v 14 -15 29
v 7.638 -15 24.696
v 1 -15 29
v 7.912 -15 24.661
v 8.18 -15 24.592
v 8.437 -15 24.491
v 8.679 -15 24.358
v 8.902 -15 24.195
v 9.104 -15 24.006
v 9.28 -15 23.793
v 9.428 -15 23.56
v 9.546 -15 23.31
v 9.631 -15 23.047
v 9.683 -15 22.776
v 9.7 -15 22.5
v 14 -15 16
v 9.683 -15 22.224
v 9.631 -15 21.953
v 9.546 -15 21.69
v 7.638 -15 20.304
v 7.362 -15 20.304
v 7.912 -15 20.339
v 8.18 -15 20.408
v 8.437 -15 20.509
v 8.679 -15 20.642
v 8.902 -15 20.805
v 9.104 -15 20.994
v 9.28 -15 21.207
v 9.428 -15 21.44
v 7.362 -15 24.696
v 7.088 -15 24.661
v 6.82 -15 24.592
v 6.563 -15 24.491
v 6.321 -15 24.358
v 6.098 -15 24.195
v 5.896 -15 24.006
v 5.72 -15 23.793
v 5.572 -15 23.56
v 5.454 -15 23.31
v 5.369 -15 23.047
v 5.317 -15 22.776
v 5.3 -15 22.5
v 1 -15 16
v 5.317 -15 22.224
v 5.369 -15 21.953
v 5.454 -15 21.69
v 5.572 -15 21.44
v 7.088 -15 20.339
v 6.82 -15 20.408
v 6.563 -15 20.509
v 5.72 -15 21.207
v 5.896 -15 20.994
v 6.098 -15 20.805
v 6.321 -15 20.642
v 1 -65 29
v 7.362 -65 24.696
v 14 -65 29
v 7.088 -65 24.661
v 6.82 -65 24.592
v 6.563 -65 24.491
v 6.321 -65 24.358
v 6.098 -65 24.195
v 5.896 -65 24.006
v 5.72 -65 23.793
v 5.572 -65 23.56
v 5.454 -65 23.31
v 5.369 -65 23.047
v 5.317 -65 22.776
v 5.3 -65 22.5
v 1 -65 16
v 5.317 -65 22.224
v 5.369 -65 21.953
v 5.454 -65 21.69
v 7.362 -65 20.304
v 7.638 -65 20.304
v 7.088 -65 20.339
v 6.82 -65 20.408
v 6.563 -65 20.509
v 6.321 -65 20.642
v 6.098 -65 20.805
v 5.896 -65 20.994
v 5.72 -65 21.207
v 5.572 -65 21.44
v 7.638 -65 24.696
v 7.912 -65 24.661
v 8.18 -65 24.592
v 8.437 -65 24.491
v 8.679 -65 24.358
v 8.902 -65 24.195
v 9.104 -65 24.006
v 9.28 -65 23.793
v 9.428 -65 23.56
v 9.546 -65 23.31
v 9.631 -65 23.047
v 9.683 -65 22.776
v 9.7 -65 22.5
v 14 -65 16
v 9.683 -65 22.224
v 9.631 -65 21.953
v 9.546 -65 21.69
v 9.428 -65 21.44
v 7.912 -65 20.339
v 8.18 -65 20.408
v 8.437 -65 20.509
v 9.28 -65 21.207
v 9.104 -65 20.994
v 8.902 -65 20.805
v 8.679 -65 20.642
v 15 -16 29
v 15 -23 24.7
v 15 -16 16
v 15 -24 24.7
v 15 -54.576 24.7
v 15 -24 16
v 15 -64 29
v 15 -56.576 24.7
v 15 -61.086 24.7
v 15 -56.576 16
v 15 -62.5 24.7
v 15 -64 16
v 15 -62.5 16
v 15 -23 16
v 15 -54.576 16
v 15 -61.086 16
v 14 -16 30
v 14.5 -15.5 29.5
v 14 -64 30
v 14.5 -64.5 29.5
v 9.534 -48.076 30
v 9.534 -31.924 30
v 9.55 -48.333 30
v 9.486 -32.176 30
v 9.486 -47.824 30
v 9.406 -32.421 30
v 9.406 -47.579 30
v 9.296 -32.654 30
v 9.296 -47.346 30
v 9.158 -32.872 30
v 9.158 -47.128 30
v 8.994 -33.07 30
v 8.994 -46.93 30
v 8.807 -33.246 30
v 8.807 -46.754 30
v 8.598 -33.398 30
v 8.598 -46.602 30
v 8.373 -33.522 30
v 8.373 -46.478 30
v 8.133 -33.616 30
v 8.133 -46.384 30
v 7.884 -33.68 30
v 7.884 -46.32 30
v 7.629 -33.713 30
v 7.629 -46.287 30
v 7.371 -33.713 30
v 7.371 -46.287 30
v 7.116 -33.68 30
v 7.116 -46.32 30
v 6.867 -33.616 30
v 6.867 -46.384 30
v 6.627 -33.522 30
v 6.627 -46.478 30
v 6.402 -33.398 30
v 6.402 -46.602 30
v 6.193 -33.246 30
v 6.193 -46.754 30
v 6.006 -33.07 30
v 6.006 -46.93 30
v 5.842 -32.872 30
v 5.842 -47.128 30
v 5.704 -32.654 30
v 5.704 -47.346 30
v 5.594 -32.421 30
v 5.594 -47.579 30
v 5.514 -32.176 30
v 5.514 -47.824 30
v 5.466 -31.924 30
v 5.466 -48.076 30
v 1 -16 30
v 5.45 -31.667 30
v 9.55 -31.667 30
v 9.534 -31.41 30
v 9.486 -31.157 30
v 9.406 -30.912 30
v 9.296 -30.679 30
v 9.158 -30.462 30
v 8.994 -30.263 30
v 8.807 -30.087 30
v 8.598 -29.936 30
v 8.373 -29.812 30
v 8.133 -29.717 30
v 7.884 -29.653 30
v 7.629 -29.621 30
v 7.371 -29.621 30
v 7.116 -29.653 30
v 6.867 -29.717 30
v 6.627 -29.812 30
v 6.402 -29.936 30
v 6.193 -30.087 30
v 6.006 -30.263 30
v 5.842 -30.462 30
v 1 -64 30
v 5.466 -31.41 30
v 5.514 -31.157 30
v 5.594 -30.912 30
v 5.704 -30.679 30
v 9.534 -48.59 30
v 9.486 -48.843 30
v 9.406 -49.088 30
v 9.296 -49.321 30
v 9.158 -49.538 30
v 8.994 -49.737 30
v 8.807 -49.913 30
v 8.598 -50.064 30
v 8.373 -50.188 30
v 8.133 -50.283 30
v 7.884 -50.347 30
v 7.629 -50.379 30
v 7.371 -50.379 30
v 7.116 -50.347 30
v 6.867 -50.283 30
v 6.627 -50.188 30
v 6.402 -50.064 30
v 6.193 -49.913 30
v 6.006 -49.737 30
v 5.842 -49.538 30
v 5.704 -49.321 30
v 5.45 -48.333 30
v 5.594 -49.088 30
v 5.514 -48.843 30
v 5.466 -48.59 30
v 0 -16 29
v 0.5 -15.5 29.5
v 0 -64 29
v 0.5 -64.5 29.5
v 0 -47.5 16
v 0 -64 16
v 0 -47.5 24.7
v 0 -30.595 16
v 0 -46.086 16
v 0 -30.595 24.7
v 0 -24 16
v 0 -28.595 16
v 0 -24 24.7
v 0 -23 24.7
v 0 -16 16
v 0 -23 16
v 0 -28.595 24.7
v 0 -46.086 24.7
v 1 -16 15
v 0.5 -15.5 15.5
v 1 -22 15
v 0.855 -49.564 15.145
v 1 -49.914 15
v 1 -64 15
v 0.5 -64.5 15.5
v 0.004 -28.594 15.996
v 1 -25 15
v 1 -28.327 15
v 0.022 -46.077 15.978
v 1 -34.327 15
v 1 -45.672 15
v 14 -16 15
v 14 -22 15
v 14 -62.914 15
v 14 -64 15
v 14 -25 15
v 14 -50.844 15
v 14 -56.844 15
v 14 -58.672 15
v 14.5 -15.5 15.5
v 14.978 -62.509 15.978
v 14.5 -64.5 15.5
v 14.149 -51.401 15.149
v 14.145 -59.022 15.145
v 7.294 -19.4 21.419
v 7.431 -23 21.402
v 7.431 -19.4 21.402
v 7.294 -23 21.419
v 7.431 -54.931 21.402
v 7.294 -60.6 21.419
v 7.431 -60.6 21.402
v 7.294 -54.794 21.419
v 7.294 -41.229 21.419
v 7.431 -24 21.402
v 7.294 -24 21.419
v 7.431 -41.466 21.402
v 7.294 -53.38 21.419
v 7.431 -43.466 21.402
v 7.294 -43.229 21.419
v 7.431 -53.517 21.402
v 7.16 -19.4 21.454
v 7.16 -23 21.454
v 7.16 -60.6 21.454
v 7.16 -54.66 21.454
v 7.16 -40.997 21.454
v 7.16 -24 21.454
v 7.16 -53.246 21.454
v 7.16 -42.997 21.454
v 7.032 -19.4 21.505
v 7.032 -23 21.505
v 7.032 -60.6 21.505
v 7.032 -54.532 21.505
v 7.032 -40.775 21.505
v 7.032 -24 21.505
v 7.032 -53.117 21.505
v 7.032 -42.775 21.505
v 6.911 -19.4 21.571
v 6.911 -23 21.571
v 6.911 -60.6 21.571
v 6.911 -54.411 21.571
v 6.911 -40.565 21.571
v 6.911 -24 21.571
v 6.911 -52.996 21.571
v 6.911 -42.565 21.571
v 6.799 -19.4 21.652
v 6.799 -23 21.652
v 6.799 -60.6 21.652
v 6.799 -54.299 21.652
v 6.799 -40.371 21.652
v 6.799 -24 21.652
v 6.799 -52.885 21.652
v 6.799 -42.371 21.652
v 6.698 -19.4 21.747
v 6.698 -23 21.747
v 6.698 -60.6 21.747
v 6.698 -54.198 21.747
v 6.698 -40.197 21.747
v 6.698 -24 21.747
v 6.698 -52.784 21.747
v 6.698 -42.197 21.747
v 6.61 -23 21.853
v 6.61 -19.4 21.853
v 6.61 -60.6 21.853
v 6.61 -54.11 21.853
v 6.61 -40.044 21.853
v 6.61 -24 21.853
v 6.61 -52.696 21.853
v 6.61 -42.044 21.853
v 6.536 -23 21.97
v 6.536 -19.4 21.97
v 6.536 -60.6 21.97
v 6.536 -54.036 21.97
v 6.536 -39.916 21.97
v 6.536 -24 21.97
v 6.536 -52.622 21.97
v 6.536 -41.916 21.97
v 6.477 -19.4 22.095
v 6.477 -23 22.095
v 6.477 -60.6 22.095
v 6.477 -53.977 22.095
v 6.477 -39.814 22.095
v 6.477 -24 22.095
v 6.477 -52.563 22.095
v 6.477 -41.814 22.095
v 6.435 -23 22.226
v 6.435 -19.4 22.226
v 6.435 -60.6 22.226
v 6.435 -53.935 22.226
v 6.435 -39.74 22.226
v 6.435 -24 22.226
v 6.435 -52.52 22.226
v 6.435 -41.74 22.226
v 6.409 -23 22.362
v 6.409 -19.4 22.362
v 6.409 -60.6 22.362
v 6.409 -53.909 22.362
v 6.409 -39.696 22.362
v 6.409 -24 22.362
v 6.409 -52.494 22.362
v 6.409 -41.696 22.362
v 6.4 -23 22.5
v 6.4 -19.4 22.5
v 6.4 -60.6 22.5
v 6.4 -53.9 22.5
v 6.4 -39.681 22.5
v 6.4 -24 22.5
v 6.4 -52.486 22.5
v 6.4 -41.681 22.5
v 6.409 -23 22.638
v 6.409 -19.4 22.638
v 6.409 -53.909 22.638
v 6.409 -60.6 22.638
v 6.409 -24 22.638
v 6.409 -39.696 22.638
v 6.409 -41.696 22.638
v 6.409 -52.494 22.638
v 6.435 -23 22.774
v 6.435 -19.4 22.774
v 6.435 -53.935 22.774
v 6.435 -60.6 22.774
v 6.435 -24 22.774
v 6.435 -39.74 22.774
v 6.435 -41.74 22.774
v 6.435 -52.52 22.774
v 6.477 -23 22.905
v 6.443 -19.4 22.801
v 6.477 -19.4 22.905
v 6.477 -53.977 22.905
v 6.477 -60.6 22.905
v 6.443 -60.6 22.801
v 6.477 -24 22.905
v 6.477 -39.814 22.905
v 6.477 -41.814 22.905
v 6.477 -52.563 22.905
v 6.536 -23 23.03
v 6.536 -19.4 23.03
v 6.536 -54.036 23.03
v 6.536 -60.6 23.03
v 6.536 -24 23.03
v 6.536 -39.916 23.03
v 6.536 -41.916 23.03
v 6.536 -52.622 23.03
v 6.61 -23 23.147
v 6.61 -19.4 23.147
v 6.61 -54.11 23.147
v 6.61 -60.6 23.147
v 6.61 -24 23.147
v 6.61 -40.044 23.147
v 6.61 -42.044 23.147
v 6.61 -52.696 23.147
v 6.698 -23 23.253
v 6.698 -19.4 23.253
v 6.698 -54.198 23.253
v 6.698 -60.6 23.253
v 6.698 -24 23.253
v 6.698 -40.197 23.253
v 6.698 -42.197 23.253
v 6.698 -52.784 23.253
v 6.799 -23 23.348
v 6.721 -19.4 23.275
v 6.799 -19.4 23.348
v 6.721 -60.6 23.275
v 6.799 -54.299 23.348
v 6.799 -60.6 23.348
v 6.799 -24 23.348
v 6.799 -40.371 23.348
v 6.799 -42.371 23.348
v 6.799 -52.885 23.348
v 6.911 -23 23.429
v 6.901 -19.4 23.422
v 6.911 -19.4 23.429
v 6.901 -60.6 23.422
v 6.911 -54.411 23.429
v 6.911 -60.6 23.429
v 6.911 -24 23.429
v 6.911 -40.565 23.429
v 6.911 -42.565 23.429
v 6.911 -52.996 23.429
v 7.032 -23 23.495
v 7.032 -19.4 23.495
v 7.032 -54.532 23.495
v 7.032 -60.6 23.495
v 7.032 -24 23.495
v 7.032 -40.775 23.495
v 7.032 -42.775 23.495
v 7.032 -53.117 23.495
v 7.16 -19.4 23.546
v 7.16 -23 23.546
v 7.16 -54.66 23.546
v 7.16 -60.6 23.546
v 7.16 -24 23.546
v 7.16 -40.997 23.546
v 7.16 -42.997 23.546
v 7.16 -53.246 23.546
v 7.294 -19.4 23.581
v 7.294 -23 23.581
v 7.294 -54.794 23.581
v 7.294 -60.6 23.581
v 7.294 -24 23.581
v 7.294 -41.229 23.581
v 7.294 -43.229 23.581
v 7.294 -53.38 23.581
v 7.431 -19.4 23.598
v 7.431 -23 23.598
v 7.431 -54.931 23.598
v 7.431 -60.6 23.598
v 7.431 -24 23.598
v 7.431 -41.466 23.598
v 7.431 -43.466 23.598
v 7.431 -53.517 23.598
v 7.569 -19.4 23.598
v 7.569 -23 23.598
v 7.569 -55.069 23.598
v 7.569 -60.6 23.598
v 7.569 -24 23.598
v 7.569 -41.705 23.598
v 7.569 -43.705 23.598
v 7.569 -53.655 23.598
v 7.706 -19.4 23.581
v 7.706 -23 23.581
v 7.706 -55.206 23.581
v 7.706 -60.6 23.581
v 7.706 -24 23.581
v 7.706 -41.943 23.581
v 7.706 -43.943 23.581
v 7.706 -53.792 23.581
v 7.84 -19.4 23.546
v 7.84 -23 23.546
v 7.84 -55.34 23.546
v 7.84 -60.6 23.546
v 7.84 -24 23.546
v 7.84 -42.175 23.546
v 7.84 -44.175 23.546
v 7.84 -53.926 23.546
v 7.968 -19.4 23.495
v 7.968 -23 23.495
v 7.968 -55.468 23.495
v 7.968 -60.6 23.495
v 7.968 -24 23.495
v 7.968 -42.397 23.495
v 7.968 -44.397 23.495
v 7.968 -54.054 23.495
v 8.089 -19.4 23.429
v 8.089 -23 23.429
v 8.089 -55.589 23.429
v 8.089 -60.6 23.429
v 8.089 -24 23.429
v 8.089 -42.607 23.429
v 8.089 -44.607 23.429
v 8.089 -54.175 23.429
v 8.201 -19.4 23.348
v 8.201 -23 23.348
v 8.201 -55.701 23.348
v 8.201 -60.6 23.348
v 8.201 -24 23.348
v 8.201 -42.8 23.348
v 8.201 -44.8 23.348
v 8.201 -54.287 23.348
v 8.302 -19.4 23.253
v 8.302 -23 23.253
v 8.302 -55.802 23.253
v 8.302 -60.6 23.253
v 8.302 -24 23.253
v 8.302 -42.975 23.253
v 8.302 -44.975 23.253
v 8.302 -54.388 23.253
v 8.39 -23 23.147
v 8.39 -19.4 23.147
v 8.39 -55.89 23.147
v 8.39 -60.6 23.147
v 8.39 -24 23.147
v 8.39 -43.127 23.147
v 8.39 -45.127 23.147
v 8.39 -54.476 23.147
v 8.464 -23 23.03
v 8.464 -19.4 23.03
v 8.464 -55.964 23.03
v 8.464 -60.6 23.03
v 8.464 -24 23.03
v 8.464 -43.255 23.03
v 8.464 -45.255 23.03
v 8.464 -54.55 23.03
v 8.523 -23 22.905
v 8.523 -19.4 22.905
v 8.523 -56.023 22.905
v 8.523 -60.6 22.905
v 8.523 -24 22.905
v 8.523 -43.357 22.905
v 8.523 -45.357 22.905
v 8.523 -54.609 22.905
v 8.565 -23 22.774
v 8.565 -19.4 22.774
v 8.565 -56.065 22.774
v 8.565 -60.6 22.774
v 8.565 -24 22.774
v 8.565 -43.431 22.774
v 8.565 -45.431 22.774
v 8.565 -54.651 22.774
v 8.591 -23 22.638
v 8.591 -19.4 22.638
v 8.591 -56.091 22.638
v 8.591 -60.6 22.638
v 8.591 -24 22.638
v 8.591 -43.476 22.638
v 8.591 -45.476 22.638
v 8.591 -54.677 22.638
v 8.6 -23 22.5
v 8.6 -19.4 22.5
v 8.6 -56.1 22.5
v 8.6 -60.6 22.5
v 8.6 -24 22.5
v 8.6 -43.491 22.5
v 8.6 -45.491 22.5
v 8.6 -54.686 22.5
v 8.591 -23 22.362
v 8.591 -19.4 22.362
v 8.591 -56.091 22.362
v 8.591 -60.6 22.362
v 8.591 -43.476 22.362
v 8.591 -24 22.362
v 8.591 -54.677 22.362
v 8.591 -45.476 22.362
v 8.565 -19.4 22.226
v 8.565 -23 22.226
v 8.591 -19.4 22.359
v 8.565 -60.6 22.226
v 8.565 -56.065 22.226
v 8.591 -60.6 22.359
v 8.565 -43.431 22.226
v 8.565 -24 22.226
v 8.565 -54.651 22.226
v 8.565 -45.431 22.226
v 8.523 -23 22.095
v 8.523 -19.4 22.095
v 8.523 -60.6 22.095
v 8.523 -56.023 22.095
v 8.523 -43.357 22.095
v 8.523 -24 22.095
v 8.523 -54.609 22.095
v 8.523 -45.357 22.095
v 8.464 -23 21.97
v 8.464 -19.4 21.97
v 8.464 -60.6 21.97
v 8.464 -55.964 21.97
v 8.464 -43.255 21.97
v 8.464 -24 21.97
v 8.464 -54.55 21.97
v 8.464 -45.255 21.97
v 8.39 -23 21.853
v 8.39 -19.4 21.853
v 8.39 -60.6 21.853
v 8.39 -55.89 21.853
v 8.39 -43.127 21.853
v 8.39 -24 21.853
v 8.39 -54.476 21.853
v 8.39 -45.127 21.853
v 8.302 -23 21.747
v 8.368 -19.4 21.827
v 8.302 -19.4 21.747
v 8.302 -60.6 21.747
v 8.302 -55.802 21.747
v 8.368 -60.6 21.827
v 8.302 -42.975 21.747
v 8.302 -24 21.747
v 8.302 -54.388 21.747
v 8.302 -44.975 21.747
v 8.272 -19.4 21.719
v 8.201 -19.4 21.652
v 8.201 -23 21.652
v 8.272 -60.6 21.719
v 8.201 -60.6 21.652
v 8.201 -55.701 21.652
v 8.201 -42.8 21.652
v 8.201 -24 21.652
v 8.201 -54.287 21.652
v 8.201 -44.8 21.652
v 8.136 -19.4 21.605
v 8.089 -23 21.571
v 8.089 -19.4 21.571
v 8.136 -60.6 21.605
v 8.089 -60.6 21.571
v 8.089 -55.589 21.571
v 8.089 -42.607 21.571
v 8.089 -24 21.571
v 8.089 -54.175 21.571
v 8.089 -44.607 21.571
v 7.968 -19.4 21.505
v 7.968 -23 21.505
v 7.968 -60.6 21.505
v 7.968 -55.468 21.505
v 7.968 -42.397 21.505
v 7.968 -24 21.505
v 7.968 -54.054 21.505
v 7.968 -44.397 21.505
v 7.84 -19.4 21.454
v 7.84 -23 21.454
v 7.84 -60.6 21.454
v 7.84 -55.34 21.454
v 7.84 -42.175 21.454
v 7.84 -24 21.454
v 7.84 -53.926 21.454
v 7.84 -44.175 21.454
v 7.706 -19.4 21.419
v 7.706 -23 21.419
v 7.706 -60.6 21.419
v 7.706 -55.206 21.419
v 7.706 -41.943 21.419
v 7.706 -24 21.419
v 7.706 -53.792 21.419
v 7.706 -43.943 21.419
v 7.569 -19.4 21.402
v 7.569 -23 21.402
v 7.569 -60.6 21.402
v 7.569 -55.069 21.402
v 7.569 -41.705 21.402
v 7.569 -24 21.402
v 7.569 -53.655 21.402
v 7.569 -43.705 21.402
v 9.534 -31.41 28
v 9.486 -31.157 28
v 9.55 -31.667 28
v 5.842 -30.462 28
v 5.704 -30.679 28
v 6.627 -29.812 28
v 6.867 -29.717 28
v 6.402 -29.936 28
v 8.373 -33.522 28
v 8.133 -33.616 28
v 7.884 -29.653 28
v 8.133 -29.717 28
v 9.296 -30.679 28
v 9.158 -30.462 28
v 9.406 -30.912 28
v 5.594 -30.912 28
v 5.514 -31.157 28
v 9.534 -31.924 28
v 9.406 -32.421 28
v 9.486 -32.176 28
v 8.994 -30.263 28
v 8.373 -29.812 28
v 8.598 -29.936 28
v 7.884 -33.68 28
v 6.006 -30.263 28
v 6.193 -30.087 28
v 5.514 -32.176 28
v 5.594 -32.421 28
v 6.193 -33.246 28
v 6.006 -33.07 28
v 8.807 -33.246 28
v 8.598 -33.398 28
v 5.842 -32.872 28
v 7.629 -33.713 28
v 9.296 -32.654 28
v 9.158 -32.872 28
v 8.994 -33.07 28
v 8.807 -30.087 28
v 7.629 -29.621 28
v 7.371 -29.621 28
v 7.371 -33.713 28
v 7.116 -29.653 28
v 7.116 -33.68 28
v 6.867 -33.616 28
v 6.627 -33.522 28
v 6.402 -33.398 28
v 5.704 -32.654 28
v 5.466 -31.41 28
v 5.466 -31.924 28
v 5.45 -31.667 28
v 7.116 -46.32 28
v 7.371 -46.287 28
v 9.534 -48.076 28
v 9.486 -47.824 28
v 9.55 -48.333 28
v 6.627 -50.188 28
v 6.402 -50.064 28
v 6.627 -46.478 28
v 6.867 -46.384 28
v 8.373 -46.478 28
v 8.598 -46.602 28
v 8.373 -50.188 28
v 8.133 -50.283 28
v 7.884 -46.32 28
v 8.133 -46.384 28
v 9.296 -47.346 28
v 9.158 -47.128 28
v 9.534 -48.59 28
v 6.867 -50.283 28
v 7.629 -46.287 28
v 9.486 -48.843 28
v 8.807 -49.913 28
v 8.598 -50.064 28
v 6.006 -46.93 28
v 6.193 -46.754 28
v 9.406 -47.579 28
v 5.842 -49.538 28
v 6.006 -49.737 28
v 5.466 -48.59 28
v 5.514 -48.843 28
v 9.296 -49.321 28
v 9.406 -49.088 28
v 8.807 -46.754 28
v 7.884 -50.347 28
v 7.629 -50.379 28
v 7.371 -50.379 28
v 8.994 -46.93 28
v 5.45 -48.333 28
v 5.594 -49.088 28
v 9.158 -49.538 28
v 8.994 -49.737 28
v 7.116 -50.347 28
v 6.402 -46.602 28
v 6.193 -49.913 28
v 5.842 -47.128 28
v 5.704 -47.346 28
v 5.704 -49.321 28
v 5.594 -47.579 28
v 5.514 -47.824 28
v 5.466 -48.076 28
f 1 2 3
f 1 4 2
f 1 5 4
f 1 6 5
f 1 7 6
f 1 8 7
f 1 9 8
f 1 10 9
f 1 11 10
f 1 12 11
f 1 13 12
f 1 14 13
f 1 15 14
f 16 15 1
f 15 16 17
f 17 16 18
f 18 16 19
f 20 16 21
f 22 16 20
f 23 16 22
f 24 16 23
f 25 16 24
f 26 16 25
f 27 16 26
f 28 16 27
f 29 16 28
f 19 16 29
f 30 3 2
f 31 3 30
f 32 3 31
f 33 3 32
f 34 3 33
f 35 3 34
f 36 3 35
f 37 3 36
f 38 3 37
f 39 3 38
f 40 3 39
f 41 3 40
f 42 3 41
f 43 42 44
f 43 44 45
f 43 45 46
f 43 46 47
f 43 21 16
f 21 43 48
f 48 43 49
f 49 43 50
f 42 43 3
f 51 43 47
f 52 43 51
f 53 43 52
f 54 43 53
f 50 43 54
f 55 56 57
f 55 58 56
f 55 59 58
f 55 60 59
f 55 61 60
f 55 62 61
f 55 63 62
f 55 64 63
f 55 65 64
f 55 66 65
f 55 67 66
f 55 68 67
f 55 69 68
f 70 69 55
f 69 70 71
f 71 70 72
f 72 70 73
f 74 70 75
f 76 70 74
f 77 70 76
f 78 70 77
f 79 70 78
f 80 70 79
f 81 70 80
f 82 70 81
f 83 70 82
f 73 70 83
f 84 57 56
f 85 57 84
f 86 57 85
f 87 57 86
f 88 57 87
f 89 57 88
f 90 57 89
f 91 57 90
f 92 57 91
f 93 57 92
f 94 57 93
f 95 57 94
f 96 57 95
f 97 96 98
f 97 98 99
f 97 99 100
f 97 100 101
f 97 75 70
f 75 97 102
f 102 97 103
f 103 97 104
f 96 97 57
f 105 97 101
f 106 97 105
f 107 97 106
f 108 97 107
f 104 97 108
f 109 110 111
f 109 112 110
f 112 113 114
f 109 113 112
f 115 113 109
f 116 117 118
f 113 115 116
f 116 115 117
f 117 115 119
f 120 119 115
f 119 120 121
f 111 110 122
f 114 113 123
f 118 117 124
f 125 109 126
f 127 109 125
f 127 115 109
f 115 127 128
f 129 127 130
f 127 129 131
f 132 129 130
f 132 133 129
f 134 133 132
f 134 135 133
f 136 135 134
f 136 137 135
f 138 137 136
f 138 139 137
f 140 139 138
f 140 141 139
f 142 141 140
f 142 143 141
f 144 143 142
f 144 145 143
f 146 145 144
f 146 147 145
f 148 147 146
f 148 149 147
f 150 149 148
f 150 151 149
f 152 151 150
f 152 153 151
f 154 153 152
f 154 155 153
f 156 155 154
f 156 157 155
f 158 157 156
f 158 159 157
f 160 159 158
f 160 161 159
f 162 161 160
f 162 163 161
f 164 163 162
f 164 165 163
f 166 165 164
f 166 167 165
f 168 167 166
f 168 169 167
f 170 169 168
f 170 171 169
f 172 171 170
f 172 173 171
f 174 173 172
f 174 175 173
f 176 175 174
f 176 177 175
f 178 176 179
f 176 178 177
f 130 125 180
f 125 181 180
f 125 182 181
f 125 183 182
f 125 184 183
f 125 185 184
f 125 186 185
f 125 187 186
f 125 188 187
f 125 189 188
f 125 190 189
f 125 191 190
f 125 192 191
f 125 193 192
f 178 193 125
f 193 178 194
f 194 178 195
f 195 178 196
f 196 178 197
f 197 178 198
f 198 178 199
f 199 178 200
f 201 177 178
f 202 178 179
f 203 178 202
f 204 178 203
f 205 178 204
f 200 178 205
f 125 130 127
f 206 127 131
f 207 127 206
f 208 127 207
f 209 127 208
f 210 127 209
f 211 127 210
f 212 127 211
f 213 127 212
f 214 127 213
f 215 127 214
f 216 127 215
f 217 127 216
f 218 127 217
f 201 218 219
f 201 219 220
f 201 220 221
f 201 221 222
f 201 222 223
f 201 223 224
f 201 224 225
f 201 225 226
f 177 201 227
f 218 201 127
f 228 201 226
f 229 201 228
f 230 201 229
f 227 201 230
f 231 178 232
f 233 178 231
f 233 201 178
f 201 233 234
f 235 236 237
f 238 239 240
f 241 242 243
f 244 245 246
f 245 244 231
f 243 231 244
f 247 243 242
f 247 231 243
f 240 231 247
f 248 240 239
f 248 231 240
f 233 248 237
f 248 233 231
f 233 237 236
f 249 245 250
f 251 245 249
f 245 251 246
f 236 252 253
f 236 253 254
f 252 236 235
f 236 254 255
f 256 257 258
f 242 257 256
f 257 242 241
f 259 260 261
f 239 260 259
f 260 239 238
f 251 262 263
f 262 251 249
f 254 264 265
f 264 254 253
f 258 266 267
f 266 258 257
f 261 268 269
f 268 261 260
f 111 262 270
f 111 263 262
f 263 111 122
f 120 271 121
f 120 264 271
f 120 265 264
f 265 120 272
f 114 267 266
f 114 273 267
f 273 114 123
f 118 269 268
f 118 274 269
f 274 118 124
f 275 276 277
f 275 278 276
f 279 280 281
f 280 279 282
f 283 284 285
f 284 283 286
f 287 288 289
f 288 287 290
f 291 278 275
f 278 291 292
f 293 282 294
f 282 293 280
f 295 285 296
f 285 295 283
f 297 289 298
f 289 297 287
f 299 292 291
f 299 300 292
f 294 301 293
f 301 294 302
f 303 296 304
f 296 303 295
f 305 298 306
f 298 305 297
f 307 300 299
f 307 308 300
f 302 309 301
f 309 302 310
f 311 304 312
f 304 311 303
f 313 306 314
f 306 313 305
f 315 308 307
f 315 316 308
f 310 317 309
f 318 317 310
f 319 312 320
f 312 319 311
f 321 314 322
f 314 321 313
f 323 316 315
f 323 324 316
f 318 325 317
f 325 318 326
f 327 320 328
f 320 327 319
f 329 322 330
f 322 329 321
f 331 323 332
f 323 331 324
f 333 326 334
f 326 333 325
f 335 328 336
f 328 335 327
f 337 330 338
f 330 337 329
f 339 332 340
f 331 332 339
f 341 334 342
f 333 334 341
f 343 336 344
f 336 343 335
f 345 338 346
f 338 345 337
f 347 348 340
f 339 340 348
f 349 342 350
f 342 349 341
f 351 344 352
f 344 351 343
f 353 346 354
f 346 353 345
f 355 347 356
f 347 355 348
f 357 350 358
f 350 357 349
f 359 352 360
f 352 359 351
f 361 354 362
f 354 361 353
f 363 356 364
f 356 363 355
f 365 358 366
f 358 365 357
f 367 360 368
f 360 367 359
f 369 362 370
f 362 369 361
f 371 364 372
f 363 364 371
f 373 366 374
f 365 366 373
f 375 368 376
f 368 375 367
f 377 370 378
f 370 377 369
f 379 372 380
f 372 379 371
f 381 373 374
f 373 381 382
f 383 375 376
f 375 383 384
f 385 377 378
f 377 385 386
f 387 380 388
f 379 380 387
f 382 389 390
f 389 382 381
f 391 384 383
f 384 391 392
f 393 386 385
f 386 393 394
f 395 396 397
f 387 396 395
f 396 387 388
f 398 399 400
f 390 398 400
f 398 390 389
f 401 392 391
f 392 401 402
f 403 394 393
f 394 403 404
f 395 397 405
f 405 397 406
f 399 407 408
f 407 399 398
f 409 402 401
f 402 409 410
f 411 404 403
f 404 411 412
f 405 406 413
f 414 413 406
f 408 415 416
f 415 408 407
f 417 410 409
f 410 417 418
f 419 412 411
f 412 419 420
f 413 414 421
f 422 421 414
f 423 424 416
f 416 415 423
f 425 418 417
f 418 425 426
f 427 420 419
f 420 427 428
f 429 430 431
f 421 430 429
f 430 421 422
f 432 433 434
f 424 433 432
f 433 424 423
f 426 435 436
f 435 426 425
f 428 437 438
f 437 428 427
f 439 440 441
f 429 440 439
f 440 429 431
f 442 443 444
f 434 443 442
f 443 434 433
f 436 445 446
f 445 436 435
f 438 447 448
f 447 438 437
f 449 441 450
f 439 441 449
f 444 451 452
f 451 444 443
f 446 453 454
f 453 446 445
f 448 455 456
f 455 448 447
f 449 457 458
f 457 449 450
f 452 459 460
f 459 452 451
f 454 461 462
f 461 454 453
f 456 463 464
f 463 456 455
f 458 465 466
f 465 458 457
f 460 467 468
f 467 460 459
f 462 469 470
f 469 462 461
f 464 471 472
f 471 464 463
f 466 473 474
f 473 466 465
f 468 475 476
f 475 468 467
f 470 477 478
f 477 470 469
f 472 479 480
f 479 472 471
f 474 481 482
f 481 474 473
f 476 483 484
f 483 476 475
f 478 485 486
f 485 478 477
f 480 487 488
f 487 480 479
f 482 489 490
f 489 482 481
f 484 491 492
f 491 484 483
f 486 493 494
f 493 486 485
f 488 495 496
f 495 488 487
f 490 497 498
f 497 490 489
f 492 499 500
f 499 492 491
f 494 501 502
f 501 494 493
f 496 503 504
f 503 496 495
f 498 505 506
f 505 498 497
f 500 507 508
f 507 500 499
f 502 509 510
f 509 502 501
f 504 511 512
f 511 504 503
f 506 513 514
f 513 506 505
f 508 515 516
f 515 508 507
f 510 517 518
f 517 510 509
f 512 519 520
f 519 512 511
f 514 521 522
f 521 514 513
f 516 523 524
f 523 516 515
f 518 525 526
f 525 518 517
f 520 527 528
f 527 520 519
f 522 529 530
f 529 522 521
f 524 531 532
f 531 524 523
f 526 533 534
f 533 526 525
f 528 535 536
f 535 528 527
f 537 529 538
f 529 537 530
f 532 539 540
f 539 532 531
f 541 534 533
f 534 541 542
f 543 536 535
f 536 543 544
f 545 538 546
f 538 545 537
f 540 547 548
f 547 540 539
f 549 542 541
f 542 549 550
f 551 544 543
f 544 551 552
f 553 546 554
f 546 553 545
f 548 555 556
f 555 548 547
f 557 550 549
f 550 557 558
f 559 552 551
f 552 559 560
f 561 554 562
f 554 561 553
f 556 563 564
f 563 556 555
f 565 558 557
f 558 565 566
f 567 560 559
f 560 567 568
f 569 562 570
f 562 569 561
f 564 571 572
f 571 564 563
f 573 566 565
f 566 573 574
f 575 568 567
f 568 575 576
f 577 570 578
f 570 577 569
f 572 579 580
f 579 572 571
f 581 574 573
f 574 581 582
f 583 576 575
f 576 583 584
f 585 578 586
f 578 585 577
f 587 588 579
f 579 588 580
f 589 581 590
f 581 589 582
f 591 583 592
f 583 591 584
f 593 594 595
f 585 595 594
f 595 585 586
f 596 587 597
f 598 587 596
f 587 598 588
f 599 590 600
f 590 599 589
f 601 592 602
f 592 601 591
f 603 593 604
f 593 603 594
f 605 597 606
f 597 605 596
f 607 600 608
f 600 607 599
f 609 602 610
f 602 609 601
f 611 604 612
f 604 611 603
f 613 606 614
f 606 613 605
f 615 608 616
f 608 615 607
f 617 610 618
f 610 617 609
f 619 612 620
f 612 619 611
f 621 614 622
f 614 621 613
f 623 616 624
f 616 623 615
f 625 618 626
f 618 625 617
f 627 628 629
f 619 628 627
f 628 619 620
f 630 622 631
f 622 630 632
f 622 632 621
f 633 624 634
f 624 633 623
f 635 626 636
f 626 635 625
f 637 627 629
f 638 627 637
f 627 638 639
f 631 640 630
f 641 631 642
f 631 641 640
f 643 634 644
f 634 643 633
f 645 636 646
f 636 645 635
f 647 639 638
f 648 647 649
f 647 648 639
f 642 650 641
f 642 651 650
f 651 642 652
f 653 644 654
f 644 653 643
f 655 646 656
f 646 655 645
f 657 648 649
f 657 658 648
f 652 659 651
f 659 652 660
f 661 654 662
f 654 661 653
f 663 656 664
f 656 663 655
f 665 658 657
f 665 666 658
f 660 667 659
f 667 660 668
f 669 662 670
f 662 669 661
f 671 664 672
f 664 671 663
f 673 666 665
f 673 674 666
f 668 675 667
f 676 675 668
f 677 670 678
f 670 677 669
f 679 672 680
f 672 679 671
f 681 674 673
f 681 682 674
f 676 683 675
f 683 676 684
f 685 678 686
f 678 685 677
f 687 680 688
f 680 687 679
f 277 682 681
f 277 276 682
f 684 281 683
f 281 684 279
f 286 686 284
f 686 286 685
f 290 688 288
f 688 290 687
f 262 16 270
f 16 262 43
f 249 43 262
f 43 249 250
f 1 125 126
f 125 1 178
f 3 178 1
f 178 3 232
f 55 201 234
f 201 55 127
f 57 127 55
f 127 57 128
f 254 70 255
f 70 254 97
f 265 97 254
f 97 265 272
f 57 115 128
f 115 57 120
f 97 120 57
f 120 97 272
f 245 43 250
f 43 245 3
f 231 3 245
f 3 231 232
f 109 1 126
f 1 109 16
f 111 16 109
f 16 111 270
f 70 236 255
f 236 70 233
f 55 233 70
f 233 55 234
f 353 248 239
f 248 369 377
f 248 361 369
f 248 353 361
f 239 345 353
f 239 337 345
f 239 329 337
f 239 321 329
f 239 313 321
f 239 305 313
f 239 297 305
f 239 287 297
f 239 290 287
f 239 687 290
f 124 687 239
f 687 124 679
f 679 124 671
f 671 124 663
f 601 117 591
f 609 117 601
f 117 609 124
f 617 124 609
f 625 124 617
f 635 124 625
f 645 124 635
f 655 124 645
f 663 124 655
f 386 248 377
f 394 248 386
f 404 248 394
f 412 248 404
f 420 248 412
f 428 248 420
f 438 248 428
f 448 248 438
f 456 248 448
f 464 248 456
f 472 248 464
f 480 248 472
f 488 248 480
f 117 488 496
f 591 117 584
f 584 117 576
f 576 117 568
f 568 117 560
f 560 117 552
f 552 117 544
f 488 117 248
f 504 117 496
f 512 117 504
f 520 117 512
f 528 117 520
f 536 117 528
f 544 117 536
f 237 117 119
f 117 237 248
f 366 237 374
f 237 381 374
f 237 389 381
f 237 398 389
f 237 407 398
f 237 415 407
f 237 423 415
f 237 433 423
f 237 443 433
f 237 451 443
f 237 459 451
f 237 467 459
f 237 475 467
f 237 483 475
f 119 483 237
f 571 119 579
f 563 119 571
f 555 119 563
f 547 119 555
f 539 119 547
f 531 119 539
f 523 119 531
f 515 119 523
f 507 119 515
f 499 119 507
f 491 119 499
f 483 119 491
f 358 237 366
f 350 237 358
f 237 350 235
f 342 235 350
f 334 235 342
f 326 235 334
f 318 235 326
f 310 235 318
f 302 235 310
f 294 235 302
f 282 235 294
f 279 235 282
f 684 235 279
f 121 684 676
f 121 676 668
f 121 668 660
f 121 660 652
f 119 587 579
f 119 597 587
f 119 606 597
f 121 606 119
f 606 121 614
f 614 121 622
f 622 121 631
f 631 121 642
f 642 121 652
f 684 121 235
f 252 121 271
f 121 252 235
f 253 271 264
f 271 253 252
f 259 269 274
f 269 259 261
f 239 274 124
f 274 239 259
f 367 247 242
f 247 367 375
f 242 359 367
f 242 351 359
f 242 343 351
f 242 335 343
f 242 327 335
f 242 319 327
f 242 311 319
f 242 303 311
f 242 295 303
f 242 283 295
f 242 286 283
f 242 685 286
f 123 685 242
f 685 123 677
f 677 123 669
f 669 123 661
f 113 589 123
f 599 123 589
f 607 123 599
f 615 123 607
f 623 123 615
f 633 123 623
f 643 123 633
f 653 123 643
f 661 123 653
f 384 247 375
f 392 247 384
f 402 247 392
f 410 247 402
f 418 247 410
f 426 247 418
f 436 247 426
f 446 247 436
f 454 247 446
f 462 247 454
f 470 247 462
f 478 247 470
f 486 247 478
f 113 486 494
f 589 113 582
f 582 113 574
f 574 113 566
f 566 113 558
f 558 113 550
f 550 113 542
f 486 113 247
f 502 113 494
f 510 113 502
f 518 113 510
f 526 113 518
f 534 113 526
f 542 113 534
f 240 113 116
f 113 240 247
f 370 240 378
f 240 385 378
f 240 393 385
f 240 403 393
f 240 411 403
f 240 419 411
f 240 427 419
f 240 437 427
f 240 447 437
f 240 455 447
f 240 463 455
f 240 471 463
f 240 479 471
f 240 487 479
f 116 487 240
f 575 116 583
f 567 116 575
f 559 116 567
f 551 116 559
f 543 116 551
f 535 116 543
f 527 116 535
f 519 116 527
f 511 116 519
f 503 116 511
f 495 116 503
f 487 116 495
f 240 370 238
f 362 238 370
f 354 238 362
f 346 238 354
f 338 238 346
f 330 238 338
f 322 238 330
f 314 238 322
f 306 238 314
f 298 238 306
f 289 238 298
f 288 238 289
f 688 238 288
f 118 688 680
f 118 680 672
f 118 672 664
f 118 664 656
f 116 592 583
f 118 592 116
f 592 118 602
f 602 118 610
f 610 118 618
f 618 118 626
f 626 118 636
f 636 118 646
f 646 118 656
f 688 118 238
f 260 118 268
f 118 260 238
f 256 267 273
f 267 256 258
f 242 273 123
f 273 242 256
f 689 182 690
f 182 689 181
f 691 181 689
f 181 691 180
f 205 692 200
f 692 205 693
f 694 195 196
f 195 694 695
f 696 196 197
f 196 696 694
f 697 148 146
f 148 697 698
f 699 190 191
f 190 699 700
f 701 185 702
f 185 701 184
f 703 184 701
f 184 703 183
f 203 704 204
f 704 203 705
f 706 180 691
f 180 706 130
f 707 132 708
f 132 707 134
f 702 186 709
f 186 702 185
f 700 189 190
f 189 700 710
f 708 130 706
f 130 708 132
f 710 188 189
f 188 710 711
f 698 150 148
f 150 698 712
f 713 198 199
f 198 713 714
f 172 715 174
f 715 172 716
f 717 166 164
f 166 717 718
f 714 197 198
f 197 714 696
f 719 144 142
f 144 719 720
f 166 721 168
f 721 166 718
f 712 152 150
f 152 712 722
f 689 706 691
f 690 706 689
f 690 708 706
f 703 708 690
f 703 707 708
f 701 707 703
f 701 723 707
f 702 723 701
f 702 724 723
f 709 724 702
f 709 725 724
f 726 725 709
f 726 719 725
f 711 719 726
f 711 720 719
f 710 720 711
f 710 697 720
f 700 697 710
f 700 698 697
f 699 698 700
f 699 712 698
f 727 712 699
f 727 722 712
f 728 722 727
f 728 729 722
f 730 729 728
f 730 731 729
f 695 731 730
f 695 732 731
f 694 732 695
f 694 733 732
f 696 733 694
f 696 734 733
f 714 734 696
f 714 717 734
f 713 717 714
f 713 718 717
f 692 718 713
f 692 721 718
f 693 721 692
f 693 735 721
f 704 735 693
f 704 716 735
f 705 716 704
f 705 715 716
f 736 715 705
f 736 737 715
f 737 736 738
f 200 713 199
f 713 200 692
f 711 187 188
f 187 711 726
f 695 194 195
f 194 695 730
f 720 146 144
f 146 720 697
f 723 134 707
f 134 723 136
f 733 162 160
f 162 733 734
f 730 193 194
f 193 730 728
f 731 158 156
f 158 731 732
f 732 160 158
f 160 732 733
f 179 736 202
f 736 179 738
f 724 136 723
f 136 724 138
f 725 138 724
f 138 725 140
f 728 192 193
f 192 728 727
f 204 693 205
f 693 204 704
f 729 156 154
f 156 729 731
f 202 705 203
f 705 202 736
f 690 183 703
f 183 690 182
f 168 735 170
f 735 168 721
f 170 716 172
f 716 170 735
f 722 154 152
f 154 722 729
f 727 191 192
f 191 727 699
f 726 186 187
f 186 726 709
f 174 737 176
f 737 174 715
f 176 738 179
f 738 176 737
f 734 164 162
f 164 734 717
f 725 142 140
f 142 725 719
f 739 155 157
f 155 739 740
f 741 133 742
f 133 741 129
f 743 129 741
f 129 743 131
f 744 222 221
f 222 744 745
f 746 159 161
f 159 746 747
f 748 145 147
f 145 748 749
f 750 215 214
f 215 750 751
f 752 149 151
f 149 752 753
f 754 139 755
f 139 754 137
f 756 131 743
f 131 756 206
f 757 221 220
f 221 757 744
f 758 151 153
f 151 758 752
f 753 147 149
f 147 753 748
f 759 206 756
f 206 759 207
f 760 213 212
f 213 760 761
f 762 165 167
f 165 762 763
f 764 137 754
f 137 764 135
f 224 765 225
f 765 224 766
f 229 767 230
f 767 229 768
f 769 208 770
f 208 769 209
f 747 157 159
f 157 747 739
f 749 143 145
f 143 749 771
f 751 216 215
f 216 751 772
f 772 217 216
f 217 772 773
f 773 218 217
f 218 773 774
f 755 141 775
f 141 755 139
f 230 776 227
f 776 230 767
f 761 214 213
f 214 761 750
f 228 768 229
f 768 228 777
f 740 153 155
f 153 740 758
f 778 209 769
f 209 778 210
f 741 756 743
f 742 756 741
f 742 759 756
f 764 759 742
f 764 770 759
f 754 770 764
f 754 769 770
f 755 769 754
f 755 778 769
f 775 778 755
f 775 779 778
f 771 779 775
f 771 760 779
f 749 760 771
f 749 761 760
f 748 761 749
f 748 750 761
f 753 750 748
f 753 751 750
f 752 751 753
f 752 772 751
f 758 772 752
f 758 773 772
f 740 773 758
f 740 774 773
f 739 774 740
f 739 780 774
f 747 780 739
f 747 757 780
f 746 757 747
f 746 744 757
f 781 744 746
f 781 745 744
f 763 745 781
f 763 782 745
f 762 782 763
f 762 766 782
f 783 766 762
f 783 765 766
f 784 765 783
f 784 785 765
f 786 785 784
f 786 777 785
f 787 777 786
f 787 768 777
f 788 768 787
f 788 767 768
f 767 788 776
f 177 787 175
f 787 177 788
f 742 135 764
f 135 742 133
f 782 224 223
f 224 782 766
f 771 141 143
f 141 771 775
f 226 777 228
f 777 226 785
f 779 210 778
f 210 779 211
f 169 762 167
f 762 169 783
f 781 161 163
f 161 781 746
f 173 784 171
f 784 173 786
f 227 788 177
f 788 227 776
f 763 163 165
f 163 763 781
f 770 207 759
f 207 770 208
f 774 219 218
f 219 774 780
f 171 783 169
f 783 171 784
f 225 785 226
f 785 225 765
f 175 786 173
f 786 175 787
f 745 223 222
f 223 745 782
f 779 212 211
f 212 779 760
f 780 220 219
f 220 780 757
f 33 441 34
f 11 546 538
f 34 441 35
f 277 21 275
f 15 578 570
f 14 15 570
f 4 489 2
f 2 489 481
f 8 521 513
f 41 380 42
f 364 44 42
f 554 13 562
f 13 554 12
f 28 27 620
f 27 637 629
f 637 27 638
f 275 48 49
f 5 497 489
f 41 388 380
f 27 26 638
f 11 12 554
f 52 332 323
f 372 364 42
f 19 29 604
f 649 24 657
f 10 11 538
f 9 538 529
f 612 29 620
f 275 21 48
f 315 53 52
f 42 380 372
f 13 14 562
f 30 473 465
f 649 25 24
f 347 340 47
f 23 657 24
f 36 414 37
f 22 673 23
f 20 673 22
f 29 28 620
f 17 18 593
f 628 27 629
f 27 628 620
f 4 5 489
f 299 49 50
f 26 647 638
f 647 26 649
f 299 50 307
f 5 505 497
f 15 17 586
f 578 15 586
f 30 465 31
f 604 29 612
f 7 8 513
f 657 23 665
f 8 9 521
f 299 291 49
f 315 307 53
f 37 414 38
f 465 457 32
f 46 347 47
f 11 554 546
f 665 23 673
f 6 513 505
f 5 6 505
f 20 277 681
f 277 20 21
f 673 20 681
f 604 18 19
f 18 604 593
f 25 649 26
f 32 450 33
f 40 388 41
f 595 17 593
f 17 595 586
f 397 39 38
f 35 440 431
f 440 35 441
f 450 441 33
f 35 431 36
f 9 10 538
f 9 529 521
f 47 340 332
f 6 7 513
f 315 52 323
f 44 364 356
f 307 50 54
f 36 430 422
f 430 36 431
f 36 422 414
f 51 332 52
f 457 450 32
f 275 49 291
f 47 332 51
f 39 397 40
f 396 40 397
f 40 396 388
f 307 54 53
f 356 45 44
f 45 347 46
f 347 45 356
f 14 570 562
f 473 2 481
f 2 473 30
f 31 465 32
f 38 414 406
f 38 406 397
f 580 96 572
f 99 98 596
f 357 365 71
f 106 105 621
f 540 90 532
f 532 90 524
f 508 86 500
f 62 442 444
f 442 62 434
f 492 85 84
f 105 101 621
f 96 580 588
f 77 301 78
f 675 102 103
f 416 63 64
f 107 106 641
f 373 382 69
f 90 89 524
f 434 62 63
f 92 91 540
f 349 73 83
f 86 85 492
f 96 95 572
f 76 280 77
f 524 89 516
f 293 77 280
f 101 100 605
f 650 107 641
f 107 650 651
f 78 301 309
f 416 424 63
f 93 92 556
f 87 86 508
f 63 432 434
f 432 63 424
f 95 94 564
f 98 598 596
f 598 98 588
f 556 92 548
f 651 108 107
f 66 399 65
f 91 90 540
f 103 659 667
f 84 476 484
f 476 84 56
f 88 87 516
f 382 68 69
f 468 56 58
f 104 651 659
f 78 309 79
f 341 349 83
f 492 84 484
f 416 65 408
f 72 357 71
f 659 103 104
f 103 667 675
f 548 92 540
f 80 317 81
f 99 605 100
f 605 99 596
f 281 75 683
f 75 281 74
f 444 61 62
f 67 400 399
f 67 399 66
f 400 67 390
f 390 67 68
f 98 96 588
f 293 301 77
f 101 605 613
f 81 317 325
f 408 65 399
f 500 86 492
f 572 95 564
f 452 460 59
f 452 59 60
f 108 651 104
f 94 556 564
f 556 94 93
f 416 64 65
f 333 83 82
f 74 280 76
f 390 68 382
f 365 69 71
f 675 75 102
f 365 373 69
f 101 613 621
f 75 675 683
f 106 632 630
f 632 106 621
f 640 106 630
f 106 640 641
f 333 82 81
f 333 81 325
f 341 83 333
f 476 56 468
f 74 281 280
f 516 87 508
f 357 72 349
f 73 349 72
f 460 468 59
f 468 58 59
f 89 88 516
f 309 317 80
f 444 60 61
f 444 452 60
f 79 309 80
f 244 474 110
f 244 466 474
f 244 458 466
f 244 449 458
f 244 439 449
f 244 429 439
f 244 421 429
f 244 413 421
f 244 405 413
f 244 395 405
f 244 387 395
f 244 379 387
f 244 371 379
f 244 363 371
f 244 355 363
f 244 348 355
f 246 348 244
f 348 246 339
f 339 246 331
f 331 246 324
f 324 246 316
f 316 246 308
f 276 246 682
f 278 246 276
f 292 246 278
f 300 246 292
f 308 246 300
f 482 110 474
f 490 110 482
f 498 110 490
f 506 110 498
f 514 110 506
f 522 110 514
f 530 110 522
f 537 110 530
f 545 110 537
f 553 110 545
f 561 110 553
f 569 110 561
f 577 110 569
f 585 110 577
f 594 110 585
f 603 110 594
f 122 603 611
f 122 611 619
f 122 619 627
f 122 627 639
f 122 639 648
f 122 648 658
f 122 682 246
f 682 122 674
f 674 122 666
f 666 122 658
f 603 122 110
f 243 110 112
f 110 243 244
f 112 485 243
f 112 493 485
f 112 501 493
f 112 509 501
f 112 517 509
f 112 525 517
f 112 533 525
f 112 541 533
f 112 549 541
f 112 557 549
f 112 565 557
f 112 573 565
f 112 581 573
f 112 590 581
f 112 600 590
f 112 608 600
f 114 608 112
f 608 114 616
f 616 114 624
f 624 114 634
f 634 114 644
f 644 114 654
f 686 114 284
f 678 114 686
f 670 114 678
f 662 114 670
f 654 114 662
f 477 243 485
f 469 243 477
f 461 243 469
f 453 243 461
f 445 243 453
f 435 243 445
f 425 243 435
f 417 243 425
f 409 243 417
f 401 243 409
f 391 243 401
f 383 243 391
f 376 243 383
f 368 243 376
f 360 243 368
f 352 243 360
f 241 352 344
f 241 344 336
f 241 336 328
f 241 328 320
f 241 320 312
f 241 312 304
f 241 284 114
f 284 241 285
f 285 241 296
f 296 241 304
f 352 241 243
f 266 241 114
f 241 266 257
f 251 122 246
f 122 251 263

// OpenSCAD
// CHANGELOG (newest first; parsed by scripts/build-stl.mjs – format: "// <version> - <summary>", indented lines continue the entry)
// 1.0.0 - Initial versioned release: filament cutting holder with 90° and angled cutter slots, chamfered edges and magnet holes
//

/* [ Dimensions ] */
width = 15;
height = 15;
length = 50;

/* [ Corners ] */
corner_size = 1;

/* [ Filament width ] */
filament_width = 2.2;

/* [ Cutter thickness ] */
cutter_thickness = 1;

/* [ Cutter slot lead-in ] */
// size of the 45° lead-in chamfer at the slot opening (0 = none)
slot_chamfer = 1;

/* [ Angles ] */
// slot angles relative to the 90-degree slot (90 = identical to it), first one is nearest to the far end
angles = [45, 30];
// distance of the first angled slot from the end of the block
angled_slot_offset = 10;
// gap between neighbouring angled slots (measured along the filament axis)
angled_slot_gap = 10;

/* [ Magnets ] */
// number of magnet holes in the bottom face (1 = centered, 2 = thirds, ...)
magnet_count = 2;
magnet_diameter = 4;
// depth of the holes
magnet_depth = 2;
// extra diameter for fit
magnet_clearance = 0.1;

/* [ Circle resolution ] */
$fn = 50;

/* [Hidden] */
// List of parts of this model – each item = one STL file. Every name needs a branch in render_part().
parts = ["holder"];
// Which part to render: "all" = preview, otherwise a name from `parts` (set by the build script via -D).
part = "all";
model_version = "1.0.0";

// rectangle w x h with all four corners chamfered by c
module chamfered_rect(w, h, c) {
    polygon(points = [
        [c, 0], [w - c, 0], [w, c], [w, h - c],
        [w - c, h], [c, h], [0, h - c], [0, c]
    ]);
}

// width of angled slot i measured along the filament axis
function angled_slot_w(i) = cutter_thickness / sin(angles[i]);

// z (along the length) of the lower-z edge of angled slot i on the filament axis.
// The first slot ends angled_slot_offset before the far end, the others follow
// towards the middle of the block with angled_slot_gap between them.
function angled_slot_z(i) = i == 0
    ? length - angled_slot_offset - angled_slot_w(0)
    : angled_slot_z(i - 1) - angled_slot_gap - angled_slot_w(i);

// straight vertical cutter slot centered on the origin (thickness along z, running along x,
// depth along y from the top face) with lead-in chamfers
module slot_cut(len) {
    t = cutter_thickness;
    depth = height/2 + filament_width;
    c = slot_chamfer;
    e = 0.01;
    rotate([90, 0, 90]) linear_extrude(height = len, center = true) {
        polygon(points = [
            [-e,    -t/2 - c - e],
            [c,     -t/2],
            [depth, -t/2],
            [depth,  t/2],
            [c,      t/2],
            [-e,     t/2 + c + e]
        ]);
    }
}

// the 90-degree slot turned around the vertical axis so that it meets the filament axis at
// angle a (a = 90 gives exactly the 90-degree slot); zs = z of its lower-z edge on the
// filament axis. The slot leans towards z = length with growing x.
module angled_slot(a, zs) {
    w = cutter_thickness / sin(a);
    translate([width/2, 0, zs + w/2]) rotate([0, a - 90, 0]) slot_cut(width / sin(a) + 2);
}

// Print orientation: flipped so that the magnet holes face up, flat on Z=0
module holder() {
    translate([0, -height, height]) rotate([90, 0, 0]) difference() {
        // basic shape of the holder: long edges chamfered by the profile itself,
        // the edges around both end faces by intersecting with two more chamfered prisms
        intersection() {
            linear_extrude(height = length) {
                difference() {
                    // square with chamfered corners
                    chamfered_rect(width, height, corner_size);
                    // filament hole centered in the square
                    translate([width/2, height/2]) circle(d = filament_width);
                }
            };
            // end edges running along x
            rotate([90, 0, 90]) linear_extrude(height = width) chamfered_rect(height, length, corner_size);
            // end edges running along y
            translate([0, height, 0]) rotate([90, 0, 0]) linear_extrude(height = height) chamfered_rect(width, length, corner_size);
        }
        // filament cylinders at both ends
        translate([width/2, height/2, 0]) {
            cylinder(h = filament_width*2, r1 = filament_width, r2 = filament_width/2);
        }
        translate([width/2, height/2, length - filament_width*2]) {
            cylinder(h = filament_width*2, r2 = filament_width, r1 = filament_width/2);
        }

        // 90-degree cutter slot
        angled_slot(90, 8);

        // angled cutter slots on the same side, near the far end, in the order of `angles`
        for (i = [0 : len(angles) - 1]) {
            angled_slot(angles[i], angled_slot_z(i));
        }

        // magnet holes in the bottom face (local y = height), evenly spread along the length
        if (magnet_count > 0) {
            for (i = [1 : magnet_count]) {
                translate([width/2, height - magnet_depth, length * i / (magnet_count + 1)])
                    rotate([-90, 0, 0])
                        cylinder(d = magnet_diameter + magnet_clearance, h = magnet_depth + 0.01);
            }
        }
    }
}

module render_part(p) {
    if (p == "holder") holder();
    else assert(false, str("Unknown part: ", p));
}

if (part == "all") {
    // Preview: all parts
    for (p = parts) render_part(p);
} else {
    render_part(part);
}
